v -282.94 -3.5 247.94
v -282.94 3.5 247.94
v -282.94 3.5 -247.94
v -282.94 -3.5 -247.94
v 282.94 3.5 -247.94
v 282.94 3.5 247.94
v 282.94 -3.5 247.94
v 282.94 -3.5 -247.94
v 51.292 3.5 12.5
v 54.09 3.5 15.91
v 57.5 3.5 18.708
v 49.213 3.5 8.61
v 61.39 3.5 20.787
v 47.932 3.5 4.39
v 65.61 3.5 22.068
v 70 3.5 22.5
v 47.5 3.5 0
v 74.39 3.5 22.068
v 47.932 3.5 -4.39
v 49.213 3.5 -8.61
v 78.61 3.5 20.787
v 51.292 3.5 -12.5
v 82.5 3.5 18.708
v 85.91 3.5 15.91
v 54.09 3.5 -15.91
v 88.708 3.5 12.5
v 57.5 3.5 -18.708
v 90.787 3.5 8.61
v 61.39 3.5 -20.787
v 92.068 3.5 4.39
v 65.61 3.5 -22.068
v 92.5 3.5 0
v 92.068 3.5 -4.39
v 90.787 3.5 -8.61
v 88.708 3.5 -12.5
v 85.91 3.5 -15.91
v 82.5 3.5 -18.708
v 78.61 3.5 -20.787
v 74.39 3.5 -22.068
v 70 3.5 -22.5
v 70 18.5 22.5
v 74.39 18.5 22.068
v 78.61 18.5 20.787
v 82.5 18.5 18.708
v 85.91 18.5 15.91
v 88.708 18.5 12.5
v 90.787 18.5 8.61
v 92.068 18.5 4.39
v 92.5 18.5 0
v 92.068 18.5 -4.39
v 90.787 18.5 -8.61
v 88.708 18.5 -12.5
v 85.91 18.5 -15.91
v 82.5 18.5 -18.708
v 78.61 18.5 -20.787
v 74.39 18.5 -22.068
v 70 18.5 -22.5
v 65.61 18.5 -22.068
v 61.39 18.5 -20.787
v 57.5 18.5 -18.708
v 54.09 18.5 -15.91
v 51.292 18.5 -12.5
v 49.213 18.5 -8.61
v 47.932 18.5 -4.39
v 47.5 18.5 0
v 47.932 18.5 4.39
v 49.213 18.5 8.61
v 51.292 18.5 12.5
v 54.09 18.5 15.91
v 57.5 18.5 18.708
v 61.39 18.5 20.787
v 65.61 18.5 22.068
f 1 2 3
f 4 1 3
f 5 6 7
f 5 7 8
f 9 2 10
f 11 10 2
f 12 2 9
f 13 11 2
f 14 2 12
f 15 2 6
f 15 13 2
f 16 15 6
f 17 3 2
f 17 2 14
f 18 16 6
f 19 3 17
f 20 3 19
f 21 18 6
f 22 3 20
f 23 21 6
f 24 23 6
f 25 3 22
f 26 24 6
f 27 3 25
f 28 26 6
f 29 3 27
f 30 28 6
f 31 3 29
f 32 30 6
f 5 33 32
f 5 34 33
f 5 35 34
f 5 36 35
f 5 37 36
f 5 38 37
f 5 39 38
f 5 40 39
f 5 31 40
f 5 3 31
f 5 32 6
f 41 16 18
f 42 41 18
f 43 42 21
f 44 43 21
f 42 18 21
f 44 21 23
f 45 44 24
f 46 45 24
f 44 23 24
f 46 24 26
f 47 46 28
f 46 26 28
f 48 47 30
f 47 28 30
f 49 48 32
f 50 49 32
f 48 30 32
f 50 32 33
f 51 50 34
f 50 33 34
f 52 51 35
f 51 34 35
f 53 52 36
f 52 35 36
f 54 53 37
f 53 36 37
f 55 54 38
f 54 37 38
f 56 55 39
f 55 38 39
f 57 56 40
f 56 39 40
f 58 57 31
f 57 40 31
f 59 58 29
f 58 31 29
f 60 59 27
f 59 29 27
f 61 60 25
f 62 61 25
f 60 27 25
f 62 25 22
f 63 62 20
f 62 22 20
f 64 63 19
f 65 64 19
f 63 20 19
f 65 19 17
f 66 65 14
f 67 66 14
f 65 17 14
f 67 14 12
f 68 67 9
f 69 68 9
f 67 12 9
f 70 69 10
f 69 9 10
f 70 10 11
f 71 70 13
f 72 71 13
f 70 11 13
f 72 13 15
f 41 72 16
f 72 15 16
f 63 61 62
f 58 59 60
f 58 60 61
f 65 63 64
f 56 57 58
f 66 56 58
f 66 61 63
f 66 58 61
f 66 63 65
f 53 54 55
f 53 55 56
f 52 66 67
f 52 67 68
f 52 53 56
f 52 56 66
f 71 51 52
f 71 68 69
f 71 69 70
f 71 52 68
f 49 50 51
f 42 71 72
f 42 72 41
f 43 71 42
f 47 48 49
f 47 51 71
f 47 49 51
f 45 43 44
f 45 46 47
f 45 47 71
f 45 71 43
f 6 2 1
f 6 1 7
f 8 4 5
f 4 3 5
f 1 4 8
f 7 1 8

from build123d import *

# Parameters (mm, degrees)
SKETCH1_W           = 565.88
SKETCH1_H           = 495.88
BOSS_EXTRUDE1_DEPTH = 3.5
SKETCH2_R           = 22.5
BOSS_EXTRUDE2_DEPTH = 15


with BuildPart() as part:
    # Sketch1 → Boss-Extrude1 (new, symmetric)
    with BuildSketch(Plane(origin=(0, 0, 0), x_dir=(1, 0, 0), z_dir=(0, 1, 0))):
        Rectangle(SKETCH1_W, SKETCH1_H)
    extrude(amount=BOSS_EXTRUDE1_DEPTH, both=True)

    # Sketch2 → Boss-Extrude2 (add)
    with BuildSketch(Plane(origin=(0, 3.5, 0), x_dir=(1, 0, 0), z_dir=(0, 1, 0))):
        with Locations(Location((70, 0, 0), (0, 0, 270))):
            Circle(SKETCH2_R)
    extrude(amount=BOSS_EXTRUDE2_DEPTH)


solid = part.part
